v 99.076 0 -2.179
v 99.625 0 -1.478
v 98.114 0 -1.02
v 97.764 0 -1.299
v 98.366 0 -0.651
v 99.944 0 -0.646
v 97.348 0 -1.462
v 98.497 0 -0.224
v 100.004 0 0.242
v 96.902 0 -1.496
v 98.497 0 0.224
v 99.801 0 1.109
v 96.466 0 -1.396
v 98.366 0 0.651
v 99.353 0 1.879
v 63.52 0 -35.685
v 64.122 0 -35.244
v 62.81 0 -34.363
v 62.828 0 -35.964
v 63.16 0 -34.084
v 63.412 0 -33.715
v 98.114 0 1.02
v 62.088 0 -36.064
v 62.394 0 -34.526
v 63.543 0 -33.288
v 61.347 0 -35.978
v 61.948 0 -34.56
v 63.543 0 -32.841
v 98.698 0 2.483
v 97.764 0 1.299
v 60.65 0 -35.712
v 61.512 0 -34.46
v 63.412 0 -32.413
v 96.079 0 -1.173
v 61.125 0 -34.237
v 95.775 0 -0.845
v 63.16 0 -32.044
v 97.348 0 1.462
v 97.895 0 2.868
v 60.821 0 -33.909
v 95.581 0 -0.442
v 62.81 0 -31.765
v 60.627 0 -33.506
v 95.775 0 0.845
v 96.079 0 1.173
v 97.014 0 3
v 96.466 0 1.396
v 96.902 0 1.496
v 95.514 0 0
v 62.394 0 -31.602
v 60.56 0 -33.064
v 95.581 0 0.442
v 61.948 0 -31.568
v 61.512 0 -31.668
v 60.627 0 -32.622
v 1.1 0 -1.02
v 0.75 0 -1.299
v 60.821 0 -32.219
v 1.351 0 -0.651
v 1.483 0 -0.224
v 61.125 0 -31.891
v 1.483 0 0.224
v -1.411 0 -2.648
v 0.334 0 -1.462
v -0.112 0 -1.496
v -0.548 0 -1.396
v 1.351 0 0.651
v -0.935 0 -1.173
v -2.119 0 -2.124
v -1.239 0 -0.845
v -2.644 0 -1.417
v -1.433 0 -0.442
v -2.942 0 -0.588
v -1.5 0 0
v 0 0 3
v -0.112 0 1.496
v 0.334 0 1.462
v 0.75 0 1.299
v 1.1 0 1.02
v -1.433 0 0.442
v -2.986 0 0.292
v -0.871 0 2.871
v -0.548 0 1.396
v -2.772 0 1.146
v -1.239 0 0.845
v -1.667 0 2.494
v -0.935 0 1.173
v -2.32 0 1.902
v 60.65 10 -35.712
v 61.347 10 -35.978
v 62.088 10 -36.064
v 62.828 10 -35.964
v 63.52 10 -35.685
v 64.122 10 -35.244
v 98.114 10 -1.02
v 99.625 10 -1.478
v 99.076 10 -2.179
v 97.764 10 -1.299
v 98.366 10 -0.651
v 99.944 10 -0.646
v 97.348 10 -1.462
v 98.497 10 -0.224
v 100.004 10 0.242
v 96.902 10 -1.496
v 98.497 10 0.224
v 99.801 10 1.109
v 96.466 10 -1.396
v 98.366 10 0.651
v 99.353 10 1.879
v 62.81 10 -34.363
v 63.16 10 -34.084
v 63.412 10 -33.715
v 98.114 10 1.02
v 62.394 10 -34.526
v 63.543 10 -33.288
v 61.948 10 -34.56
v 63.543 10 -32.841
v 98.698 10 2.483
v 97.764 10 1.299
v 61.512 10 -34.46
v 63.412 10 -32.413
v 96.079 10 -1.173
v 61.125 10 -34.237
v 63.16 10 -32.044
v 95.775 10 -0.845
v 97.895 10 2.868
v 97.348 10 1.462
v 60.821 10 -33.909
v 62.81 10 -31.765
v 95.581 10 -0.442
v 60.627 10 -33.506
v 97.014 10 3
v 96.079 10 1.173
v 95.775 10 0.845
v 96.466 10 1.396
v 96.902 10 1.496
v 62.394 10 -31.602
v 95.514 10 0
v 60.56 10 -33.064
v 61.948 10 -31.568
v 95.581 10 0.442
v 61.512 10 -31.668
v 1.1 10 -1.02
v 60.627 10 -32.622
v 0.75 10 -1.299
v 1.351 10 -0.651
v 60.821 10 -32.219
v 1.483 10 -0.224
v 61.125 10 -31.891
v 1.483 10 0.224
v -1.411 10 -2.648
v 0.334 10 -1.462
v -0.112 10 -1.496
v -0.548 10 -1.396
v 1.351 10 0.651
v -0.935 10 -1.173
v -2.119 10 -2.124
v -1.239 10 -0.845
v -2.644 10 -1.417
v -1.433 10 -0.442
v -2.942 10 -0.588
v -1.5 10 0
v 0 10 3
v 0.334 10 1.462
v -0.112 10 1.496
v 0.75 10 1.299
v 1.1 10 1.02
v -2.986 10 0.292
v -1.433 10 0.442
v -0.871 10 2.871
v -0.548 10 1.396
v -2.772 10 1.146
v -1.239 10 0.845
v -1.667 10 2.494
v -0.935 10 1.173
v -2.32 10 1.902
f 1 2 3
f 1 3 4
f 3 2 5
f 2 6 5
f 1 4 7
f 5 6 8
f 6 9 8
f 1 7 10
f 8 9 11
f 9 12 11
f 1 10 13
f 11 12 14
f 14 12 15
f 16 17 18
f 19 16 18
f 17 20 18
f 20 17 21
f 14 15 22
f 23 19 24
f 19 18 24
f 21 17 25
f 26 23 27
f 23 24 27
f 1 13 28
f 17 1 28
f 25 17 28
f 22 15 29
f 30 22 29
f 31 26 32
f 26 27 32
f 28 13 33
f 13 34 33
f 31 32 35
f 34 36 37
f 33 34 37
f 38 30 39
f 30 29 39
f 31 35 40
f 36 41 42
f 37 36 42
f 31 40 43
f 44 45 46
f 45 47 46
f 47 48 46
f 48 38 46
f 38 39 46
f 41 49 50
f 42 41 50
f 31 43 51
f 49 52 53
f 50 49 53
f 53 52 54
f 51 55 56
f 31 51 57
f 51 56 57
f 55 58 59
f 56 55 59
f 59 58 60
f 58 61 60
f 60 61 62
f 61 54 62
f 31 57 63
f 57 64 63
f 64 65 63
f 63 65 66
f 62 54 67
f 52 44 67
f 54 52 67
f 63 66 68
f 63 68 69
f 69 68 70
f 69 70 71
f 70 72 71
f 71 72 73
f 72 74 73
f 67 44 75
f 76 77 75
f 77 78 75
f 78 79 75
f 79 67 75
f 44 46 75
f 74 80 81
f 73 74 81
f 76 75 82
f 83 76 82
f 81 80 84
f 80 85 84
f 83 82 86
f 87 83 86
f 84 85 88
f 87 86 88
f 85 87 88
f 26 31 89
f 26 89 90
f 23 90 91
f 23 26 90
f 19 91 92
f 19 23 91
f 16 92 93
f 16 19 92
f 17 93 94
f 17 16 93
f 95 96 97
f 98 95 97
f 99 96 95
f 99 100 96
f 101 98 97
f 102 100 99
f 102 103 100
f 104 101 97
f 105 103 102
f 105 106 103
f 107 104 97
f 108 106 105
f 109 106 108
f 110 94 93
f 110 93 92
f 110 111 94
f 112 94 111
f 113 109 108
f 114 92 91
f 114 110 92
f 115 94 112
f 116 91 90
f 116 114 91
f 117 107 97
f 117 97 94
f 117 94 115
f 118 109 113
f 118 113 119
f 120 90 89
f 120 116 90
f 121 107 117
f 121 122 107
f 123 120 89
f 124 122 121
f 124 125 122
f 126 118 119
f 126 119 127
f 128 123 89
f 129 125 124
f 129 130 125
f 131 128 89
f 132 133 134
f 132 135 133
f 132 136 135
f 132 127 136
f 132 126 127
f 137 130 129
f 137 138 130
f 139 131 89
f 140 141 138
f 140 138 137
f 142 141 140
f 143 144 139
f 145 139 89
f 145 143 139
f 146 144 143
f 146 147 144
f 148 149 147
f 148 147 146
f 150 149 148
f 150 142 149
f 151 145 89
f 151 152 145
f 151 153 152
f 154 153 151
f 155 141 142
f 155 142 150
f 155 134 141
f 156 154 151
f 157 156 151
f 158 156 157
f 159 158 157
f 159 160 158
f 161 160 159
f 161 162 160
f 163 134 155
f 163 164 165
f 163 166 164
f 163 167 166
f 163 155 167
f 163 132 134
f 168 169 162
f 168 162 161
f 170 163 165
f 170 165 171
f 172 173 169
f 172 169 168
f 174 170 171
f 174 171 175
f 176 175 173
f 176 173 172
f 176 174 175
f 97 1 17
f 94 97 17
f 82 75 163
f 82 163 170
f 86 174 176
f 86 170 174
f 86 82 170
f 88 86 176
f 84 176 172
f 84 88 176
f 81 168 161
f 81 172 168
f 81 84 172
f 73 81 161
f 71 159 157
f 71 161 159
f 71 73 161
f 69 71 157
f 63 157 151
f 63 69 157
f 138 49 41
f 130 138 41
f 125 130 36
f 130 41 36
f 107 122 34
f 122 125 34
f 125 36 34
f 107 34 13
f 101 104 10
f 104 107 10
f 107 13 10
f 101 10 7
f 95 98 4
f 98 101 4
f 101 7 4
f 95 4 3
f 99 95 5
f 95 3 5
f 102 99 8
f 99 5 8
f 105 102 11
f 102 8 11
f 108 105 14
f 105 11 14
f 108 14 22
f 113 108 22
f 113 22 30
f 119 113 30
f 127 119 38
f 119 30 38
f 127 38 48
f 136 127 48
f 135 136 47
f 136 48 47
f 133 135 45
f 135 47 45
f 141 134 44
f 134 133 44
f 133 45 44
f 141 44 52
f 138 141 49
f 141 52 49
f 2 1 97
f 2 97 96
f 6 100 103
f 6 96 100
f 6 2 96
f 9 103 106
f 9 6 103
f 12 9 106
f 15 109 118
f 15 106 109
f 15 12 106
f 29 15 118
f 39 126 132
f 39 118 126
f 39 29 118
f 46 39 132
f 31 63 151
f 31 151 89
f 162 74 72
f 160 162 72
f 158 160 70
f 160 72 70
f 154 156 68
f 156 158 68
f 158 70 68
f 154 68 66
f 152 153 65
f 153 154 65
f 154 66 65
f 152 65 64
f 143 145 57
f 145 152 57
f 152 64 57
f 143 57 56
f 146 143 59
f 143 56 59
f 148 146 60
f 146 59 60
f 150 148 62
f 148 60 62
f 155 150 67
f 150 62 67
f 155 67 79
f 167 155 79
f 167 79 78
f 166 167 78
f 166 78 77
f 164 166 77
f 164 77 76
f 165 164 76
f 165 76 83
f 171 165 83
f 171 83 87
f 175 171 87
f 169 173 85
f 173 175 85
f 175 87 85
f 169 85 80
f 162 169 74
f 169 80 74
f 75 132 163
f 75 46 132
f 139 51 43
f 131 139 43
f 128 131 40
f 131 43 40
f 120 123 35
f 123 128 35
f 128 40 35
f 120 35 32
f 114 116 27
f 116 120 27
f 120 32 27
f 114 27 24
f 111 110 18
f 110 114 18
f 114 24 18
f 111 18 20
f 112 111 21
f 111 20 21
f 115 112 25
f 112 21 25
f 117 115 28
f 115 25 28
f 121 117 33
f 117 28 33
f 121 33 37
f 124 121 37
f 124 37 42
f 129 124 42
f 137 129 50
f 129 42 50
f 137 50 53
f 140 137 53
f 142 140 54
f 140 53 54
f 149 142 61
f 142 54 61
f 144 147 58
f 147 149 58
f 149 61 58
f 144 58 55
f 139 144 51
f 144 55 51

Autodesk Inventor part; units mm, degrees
ref_plane "YZ Plane" through (0, 0, 0) normal (1, 0, 0) x (0, 1, 0)
ref_plane "XZ Plane" through (0, 0, 0) normal (0, 1, 0) x (-1, 0, 0)
ref_plane "XY Plane" through (0, 0, 0) normal (0, 0, 1) x (1, 0, 0)
sketch "草圖2" plane through (0, 0, 0) normal (0, 1, 0) x (-1, 0, 0)
  line L0 (-62.0601, -33.0641) -> (0, 0) construction
  line L1 (0, 0) -> (-97.0141, 0) construction
  arc A0 (-97.0141, 3) -> (-99.0756, -2.1794) centre (-97.0141, 0) ccw
  arc A1 (1.4106, -2.6477) -> (0, 3) centre (0, 0) ccw
  line L2 (-97.0141, 3) -> (0, 3)
  line L3 (-99.0756, -2.1794) -> (-64.1217, -35.2435)
  line L4 (-97.0141, 0) -> (-62.0601, -33.0641) construction
  arc A2 (-64.1217, -35.2435) -> (-60.6495, -35.7117) centre (-62.0601, -33.0641) ccw
  line L5 (1.4106, -2.6477) -> (-60.6495, -35.7117)
  circle A3 centre (-97.0141, 0) radius 1.5
  circle A4 centre (0, 0) radius 1.5
  circle A5 centre (-62.0601, -33.0641) radius 1.5
  dimension "d11" = 6
  dimension "hole" = 3
  dimension "center_distance1" = 97.0141
  dimension "center_distance3" = 48.1146
  dimension "center_distance2" = 70.3185
extrude "擠出2" add sketch "草圖2" along normal blind 10
equation "\"d11\" = 2 * hole"
properties part number "ternary_link"
